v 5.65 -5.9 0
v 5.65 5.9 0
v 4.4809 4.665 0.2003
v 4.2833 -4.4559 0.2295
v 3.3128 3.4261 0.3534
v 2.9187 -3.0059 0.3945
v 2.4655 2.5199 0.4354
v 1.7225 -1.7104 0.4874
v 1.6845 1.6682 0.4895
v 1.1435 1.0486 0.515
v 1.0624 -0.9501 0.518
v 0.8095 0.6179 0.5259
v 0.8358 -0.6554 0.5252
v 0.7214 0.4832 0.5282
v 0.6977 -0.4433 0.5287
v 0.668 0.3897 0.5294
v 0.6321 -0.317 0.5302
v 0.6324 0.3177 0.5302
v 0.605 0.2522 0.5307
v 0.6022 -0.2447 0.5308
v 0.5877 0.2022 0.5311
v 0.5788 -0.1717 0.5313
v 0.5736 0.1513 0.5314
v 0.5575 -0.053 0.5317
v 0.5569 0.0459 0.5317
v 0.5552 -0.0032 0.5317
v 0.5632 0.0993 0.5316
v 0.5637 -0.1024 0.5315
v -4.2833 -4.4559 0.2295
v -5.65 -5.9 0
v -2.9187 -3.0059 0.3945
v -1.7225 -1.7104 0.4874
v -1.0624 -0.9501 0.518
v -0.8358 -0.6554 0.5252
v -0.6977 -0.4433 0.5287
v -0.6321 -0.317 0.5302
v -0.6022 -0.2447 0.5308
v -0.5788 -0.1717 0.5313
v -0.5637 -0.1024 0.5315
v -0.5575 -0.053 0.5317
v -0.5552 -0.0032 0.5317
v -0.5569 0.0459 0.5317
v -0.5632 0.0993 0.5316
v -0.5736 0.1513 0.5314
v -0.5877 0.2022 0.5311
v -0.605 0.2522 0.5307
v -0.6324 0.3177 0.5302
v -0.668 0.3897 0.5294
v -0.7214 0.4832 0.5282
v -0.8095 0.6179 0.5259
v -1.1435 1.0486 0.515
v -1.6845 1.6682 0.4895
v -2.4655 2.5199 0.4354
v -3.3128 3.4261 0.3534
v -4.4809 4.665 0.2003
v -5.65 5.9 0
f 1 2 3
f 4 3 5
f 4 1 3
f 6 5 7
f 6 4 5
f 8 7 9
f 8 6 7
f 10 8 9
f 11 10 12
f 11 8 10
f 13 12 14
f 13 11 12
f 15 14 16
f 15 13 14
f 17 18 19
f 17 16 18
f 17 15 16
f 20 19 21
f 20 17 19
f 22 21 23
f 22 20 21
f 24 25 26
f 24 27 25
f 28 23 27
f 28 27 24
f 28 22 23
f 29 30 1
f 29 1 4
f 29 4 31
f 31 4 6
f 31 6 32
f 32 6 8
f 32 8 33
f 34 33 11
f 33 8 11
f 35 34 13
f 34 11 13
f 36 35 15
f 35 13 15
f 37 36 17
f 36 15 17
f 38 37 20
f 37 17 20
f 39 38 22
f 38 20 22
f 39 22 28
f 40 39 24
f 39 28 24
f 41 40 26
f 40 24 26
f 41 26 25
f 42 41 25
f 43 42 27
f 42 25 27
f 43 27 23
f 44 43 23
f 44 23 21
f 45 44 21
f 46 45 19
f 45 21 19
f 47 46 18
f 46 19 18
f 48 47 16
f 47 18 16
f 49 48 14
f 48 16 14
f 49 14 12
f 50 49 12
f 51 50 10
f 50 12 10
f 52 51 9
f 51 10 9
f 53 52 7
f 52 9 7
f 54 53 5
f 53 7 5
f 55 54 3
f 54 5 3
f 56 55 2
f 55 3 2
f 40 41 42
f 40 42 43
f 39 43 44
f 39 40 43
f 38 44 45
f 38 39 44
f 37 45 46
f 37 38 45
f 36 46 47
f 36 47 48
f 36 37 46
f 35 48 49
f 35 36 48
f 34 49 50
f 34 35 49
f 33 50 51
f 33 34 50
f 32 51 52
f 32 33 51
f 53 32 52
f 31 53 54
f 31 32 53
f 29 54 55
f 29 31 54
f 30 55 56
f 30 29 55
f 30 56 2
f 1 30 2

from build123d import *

# Parameters (mm, degrees)
SKETCH1_W                  = 11.3
SKETCH1_H                  = 11.8
KEY_DEPTH                  = 1
EXTRUDE2_DEPTH             = 12.8
CORTAR_EXTRUIR2_DEPTH      = 6.65
CORTAR_EXTRUIR2_DEPTH_BACK = 6.65


with BuildPart() as part:
    # Sketch1 → key (new body)
    with BuildSketch(Plane.XY):
        Rectangle(SKETCH1_W, SKETCH1_H)
    extrude(amount=KEY_DEPTH)

    # Sketch2 → Extrude2 (cut, through all)
    with BuildSketch(Plane.XZ.offset(5.9)):
        with BuildLine():
            Line((-5.65, 0), (-5.65, 1))
            Line((-5.65, 1), (5.65, 1))
            Line((5.65, 1), (5.65, 0))
            ThreePointArc((5.65, 0), (0, 0.536845043), (-5.65, 0))
        make_face()
    extrude(amount=-EXTRUDE2_DEPTH, mode=Mode.SUBTRACT)

    # Croquis1 → Cortar-Extruir2 (cut, two sides)
    with BuildSketch(Plane(origin=(0, 0, 0), x_dir=(0, 0, -1), z_dir=(1, 0, 0))) as cortar_extruir2_sk:
        with BuildLine():
            Line((0, 5.9), (-1.525972396, 5.9))
            Line((-1.525972396, 5.9), (-1.525972396, -5.9))
            Line((-1.525972396, -5.9), (0, -5.9))
            ThreePointArc((0, -5.9), (-0.531707775, 0), (0, 5.9))
        make_face()
    extrude(amount=CORTAR_EXTRUIR2_DEPTH, mode=Mode.SUBTRACT)
    extrude(cortar_extruir2_sk.sketch, amount=-CORTAR_EXTRUIR2_DEPTH_BACK, mode=Mode.SUBTRACT)


solid = part.part
